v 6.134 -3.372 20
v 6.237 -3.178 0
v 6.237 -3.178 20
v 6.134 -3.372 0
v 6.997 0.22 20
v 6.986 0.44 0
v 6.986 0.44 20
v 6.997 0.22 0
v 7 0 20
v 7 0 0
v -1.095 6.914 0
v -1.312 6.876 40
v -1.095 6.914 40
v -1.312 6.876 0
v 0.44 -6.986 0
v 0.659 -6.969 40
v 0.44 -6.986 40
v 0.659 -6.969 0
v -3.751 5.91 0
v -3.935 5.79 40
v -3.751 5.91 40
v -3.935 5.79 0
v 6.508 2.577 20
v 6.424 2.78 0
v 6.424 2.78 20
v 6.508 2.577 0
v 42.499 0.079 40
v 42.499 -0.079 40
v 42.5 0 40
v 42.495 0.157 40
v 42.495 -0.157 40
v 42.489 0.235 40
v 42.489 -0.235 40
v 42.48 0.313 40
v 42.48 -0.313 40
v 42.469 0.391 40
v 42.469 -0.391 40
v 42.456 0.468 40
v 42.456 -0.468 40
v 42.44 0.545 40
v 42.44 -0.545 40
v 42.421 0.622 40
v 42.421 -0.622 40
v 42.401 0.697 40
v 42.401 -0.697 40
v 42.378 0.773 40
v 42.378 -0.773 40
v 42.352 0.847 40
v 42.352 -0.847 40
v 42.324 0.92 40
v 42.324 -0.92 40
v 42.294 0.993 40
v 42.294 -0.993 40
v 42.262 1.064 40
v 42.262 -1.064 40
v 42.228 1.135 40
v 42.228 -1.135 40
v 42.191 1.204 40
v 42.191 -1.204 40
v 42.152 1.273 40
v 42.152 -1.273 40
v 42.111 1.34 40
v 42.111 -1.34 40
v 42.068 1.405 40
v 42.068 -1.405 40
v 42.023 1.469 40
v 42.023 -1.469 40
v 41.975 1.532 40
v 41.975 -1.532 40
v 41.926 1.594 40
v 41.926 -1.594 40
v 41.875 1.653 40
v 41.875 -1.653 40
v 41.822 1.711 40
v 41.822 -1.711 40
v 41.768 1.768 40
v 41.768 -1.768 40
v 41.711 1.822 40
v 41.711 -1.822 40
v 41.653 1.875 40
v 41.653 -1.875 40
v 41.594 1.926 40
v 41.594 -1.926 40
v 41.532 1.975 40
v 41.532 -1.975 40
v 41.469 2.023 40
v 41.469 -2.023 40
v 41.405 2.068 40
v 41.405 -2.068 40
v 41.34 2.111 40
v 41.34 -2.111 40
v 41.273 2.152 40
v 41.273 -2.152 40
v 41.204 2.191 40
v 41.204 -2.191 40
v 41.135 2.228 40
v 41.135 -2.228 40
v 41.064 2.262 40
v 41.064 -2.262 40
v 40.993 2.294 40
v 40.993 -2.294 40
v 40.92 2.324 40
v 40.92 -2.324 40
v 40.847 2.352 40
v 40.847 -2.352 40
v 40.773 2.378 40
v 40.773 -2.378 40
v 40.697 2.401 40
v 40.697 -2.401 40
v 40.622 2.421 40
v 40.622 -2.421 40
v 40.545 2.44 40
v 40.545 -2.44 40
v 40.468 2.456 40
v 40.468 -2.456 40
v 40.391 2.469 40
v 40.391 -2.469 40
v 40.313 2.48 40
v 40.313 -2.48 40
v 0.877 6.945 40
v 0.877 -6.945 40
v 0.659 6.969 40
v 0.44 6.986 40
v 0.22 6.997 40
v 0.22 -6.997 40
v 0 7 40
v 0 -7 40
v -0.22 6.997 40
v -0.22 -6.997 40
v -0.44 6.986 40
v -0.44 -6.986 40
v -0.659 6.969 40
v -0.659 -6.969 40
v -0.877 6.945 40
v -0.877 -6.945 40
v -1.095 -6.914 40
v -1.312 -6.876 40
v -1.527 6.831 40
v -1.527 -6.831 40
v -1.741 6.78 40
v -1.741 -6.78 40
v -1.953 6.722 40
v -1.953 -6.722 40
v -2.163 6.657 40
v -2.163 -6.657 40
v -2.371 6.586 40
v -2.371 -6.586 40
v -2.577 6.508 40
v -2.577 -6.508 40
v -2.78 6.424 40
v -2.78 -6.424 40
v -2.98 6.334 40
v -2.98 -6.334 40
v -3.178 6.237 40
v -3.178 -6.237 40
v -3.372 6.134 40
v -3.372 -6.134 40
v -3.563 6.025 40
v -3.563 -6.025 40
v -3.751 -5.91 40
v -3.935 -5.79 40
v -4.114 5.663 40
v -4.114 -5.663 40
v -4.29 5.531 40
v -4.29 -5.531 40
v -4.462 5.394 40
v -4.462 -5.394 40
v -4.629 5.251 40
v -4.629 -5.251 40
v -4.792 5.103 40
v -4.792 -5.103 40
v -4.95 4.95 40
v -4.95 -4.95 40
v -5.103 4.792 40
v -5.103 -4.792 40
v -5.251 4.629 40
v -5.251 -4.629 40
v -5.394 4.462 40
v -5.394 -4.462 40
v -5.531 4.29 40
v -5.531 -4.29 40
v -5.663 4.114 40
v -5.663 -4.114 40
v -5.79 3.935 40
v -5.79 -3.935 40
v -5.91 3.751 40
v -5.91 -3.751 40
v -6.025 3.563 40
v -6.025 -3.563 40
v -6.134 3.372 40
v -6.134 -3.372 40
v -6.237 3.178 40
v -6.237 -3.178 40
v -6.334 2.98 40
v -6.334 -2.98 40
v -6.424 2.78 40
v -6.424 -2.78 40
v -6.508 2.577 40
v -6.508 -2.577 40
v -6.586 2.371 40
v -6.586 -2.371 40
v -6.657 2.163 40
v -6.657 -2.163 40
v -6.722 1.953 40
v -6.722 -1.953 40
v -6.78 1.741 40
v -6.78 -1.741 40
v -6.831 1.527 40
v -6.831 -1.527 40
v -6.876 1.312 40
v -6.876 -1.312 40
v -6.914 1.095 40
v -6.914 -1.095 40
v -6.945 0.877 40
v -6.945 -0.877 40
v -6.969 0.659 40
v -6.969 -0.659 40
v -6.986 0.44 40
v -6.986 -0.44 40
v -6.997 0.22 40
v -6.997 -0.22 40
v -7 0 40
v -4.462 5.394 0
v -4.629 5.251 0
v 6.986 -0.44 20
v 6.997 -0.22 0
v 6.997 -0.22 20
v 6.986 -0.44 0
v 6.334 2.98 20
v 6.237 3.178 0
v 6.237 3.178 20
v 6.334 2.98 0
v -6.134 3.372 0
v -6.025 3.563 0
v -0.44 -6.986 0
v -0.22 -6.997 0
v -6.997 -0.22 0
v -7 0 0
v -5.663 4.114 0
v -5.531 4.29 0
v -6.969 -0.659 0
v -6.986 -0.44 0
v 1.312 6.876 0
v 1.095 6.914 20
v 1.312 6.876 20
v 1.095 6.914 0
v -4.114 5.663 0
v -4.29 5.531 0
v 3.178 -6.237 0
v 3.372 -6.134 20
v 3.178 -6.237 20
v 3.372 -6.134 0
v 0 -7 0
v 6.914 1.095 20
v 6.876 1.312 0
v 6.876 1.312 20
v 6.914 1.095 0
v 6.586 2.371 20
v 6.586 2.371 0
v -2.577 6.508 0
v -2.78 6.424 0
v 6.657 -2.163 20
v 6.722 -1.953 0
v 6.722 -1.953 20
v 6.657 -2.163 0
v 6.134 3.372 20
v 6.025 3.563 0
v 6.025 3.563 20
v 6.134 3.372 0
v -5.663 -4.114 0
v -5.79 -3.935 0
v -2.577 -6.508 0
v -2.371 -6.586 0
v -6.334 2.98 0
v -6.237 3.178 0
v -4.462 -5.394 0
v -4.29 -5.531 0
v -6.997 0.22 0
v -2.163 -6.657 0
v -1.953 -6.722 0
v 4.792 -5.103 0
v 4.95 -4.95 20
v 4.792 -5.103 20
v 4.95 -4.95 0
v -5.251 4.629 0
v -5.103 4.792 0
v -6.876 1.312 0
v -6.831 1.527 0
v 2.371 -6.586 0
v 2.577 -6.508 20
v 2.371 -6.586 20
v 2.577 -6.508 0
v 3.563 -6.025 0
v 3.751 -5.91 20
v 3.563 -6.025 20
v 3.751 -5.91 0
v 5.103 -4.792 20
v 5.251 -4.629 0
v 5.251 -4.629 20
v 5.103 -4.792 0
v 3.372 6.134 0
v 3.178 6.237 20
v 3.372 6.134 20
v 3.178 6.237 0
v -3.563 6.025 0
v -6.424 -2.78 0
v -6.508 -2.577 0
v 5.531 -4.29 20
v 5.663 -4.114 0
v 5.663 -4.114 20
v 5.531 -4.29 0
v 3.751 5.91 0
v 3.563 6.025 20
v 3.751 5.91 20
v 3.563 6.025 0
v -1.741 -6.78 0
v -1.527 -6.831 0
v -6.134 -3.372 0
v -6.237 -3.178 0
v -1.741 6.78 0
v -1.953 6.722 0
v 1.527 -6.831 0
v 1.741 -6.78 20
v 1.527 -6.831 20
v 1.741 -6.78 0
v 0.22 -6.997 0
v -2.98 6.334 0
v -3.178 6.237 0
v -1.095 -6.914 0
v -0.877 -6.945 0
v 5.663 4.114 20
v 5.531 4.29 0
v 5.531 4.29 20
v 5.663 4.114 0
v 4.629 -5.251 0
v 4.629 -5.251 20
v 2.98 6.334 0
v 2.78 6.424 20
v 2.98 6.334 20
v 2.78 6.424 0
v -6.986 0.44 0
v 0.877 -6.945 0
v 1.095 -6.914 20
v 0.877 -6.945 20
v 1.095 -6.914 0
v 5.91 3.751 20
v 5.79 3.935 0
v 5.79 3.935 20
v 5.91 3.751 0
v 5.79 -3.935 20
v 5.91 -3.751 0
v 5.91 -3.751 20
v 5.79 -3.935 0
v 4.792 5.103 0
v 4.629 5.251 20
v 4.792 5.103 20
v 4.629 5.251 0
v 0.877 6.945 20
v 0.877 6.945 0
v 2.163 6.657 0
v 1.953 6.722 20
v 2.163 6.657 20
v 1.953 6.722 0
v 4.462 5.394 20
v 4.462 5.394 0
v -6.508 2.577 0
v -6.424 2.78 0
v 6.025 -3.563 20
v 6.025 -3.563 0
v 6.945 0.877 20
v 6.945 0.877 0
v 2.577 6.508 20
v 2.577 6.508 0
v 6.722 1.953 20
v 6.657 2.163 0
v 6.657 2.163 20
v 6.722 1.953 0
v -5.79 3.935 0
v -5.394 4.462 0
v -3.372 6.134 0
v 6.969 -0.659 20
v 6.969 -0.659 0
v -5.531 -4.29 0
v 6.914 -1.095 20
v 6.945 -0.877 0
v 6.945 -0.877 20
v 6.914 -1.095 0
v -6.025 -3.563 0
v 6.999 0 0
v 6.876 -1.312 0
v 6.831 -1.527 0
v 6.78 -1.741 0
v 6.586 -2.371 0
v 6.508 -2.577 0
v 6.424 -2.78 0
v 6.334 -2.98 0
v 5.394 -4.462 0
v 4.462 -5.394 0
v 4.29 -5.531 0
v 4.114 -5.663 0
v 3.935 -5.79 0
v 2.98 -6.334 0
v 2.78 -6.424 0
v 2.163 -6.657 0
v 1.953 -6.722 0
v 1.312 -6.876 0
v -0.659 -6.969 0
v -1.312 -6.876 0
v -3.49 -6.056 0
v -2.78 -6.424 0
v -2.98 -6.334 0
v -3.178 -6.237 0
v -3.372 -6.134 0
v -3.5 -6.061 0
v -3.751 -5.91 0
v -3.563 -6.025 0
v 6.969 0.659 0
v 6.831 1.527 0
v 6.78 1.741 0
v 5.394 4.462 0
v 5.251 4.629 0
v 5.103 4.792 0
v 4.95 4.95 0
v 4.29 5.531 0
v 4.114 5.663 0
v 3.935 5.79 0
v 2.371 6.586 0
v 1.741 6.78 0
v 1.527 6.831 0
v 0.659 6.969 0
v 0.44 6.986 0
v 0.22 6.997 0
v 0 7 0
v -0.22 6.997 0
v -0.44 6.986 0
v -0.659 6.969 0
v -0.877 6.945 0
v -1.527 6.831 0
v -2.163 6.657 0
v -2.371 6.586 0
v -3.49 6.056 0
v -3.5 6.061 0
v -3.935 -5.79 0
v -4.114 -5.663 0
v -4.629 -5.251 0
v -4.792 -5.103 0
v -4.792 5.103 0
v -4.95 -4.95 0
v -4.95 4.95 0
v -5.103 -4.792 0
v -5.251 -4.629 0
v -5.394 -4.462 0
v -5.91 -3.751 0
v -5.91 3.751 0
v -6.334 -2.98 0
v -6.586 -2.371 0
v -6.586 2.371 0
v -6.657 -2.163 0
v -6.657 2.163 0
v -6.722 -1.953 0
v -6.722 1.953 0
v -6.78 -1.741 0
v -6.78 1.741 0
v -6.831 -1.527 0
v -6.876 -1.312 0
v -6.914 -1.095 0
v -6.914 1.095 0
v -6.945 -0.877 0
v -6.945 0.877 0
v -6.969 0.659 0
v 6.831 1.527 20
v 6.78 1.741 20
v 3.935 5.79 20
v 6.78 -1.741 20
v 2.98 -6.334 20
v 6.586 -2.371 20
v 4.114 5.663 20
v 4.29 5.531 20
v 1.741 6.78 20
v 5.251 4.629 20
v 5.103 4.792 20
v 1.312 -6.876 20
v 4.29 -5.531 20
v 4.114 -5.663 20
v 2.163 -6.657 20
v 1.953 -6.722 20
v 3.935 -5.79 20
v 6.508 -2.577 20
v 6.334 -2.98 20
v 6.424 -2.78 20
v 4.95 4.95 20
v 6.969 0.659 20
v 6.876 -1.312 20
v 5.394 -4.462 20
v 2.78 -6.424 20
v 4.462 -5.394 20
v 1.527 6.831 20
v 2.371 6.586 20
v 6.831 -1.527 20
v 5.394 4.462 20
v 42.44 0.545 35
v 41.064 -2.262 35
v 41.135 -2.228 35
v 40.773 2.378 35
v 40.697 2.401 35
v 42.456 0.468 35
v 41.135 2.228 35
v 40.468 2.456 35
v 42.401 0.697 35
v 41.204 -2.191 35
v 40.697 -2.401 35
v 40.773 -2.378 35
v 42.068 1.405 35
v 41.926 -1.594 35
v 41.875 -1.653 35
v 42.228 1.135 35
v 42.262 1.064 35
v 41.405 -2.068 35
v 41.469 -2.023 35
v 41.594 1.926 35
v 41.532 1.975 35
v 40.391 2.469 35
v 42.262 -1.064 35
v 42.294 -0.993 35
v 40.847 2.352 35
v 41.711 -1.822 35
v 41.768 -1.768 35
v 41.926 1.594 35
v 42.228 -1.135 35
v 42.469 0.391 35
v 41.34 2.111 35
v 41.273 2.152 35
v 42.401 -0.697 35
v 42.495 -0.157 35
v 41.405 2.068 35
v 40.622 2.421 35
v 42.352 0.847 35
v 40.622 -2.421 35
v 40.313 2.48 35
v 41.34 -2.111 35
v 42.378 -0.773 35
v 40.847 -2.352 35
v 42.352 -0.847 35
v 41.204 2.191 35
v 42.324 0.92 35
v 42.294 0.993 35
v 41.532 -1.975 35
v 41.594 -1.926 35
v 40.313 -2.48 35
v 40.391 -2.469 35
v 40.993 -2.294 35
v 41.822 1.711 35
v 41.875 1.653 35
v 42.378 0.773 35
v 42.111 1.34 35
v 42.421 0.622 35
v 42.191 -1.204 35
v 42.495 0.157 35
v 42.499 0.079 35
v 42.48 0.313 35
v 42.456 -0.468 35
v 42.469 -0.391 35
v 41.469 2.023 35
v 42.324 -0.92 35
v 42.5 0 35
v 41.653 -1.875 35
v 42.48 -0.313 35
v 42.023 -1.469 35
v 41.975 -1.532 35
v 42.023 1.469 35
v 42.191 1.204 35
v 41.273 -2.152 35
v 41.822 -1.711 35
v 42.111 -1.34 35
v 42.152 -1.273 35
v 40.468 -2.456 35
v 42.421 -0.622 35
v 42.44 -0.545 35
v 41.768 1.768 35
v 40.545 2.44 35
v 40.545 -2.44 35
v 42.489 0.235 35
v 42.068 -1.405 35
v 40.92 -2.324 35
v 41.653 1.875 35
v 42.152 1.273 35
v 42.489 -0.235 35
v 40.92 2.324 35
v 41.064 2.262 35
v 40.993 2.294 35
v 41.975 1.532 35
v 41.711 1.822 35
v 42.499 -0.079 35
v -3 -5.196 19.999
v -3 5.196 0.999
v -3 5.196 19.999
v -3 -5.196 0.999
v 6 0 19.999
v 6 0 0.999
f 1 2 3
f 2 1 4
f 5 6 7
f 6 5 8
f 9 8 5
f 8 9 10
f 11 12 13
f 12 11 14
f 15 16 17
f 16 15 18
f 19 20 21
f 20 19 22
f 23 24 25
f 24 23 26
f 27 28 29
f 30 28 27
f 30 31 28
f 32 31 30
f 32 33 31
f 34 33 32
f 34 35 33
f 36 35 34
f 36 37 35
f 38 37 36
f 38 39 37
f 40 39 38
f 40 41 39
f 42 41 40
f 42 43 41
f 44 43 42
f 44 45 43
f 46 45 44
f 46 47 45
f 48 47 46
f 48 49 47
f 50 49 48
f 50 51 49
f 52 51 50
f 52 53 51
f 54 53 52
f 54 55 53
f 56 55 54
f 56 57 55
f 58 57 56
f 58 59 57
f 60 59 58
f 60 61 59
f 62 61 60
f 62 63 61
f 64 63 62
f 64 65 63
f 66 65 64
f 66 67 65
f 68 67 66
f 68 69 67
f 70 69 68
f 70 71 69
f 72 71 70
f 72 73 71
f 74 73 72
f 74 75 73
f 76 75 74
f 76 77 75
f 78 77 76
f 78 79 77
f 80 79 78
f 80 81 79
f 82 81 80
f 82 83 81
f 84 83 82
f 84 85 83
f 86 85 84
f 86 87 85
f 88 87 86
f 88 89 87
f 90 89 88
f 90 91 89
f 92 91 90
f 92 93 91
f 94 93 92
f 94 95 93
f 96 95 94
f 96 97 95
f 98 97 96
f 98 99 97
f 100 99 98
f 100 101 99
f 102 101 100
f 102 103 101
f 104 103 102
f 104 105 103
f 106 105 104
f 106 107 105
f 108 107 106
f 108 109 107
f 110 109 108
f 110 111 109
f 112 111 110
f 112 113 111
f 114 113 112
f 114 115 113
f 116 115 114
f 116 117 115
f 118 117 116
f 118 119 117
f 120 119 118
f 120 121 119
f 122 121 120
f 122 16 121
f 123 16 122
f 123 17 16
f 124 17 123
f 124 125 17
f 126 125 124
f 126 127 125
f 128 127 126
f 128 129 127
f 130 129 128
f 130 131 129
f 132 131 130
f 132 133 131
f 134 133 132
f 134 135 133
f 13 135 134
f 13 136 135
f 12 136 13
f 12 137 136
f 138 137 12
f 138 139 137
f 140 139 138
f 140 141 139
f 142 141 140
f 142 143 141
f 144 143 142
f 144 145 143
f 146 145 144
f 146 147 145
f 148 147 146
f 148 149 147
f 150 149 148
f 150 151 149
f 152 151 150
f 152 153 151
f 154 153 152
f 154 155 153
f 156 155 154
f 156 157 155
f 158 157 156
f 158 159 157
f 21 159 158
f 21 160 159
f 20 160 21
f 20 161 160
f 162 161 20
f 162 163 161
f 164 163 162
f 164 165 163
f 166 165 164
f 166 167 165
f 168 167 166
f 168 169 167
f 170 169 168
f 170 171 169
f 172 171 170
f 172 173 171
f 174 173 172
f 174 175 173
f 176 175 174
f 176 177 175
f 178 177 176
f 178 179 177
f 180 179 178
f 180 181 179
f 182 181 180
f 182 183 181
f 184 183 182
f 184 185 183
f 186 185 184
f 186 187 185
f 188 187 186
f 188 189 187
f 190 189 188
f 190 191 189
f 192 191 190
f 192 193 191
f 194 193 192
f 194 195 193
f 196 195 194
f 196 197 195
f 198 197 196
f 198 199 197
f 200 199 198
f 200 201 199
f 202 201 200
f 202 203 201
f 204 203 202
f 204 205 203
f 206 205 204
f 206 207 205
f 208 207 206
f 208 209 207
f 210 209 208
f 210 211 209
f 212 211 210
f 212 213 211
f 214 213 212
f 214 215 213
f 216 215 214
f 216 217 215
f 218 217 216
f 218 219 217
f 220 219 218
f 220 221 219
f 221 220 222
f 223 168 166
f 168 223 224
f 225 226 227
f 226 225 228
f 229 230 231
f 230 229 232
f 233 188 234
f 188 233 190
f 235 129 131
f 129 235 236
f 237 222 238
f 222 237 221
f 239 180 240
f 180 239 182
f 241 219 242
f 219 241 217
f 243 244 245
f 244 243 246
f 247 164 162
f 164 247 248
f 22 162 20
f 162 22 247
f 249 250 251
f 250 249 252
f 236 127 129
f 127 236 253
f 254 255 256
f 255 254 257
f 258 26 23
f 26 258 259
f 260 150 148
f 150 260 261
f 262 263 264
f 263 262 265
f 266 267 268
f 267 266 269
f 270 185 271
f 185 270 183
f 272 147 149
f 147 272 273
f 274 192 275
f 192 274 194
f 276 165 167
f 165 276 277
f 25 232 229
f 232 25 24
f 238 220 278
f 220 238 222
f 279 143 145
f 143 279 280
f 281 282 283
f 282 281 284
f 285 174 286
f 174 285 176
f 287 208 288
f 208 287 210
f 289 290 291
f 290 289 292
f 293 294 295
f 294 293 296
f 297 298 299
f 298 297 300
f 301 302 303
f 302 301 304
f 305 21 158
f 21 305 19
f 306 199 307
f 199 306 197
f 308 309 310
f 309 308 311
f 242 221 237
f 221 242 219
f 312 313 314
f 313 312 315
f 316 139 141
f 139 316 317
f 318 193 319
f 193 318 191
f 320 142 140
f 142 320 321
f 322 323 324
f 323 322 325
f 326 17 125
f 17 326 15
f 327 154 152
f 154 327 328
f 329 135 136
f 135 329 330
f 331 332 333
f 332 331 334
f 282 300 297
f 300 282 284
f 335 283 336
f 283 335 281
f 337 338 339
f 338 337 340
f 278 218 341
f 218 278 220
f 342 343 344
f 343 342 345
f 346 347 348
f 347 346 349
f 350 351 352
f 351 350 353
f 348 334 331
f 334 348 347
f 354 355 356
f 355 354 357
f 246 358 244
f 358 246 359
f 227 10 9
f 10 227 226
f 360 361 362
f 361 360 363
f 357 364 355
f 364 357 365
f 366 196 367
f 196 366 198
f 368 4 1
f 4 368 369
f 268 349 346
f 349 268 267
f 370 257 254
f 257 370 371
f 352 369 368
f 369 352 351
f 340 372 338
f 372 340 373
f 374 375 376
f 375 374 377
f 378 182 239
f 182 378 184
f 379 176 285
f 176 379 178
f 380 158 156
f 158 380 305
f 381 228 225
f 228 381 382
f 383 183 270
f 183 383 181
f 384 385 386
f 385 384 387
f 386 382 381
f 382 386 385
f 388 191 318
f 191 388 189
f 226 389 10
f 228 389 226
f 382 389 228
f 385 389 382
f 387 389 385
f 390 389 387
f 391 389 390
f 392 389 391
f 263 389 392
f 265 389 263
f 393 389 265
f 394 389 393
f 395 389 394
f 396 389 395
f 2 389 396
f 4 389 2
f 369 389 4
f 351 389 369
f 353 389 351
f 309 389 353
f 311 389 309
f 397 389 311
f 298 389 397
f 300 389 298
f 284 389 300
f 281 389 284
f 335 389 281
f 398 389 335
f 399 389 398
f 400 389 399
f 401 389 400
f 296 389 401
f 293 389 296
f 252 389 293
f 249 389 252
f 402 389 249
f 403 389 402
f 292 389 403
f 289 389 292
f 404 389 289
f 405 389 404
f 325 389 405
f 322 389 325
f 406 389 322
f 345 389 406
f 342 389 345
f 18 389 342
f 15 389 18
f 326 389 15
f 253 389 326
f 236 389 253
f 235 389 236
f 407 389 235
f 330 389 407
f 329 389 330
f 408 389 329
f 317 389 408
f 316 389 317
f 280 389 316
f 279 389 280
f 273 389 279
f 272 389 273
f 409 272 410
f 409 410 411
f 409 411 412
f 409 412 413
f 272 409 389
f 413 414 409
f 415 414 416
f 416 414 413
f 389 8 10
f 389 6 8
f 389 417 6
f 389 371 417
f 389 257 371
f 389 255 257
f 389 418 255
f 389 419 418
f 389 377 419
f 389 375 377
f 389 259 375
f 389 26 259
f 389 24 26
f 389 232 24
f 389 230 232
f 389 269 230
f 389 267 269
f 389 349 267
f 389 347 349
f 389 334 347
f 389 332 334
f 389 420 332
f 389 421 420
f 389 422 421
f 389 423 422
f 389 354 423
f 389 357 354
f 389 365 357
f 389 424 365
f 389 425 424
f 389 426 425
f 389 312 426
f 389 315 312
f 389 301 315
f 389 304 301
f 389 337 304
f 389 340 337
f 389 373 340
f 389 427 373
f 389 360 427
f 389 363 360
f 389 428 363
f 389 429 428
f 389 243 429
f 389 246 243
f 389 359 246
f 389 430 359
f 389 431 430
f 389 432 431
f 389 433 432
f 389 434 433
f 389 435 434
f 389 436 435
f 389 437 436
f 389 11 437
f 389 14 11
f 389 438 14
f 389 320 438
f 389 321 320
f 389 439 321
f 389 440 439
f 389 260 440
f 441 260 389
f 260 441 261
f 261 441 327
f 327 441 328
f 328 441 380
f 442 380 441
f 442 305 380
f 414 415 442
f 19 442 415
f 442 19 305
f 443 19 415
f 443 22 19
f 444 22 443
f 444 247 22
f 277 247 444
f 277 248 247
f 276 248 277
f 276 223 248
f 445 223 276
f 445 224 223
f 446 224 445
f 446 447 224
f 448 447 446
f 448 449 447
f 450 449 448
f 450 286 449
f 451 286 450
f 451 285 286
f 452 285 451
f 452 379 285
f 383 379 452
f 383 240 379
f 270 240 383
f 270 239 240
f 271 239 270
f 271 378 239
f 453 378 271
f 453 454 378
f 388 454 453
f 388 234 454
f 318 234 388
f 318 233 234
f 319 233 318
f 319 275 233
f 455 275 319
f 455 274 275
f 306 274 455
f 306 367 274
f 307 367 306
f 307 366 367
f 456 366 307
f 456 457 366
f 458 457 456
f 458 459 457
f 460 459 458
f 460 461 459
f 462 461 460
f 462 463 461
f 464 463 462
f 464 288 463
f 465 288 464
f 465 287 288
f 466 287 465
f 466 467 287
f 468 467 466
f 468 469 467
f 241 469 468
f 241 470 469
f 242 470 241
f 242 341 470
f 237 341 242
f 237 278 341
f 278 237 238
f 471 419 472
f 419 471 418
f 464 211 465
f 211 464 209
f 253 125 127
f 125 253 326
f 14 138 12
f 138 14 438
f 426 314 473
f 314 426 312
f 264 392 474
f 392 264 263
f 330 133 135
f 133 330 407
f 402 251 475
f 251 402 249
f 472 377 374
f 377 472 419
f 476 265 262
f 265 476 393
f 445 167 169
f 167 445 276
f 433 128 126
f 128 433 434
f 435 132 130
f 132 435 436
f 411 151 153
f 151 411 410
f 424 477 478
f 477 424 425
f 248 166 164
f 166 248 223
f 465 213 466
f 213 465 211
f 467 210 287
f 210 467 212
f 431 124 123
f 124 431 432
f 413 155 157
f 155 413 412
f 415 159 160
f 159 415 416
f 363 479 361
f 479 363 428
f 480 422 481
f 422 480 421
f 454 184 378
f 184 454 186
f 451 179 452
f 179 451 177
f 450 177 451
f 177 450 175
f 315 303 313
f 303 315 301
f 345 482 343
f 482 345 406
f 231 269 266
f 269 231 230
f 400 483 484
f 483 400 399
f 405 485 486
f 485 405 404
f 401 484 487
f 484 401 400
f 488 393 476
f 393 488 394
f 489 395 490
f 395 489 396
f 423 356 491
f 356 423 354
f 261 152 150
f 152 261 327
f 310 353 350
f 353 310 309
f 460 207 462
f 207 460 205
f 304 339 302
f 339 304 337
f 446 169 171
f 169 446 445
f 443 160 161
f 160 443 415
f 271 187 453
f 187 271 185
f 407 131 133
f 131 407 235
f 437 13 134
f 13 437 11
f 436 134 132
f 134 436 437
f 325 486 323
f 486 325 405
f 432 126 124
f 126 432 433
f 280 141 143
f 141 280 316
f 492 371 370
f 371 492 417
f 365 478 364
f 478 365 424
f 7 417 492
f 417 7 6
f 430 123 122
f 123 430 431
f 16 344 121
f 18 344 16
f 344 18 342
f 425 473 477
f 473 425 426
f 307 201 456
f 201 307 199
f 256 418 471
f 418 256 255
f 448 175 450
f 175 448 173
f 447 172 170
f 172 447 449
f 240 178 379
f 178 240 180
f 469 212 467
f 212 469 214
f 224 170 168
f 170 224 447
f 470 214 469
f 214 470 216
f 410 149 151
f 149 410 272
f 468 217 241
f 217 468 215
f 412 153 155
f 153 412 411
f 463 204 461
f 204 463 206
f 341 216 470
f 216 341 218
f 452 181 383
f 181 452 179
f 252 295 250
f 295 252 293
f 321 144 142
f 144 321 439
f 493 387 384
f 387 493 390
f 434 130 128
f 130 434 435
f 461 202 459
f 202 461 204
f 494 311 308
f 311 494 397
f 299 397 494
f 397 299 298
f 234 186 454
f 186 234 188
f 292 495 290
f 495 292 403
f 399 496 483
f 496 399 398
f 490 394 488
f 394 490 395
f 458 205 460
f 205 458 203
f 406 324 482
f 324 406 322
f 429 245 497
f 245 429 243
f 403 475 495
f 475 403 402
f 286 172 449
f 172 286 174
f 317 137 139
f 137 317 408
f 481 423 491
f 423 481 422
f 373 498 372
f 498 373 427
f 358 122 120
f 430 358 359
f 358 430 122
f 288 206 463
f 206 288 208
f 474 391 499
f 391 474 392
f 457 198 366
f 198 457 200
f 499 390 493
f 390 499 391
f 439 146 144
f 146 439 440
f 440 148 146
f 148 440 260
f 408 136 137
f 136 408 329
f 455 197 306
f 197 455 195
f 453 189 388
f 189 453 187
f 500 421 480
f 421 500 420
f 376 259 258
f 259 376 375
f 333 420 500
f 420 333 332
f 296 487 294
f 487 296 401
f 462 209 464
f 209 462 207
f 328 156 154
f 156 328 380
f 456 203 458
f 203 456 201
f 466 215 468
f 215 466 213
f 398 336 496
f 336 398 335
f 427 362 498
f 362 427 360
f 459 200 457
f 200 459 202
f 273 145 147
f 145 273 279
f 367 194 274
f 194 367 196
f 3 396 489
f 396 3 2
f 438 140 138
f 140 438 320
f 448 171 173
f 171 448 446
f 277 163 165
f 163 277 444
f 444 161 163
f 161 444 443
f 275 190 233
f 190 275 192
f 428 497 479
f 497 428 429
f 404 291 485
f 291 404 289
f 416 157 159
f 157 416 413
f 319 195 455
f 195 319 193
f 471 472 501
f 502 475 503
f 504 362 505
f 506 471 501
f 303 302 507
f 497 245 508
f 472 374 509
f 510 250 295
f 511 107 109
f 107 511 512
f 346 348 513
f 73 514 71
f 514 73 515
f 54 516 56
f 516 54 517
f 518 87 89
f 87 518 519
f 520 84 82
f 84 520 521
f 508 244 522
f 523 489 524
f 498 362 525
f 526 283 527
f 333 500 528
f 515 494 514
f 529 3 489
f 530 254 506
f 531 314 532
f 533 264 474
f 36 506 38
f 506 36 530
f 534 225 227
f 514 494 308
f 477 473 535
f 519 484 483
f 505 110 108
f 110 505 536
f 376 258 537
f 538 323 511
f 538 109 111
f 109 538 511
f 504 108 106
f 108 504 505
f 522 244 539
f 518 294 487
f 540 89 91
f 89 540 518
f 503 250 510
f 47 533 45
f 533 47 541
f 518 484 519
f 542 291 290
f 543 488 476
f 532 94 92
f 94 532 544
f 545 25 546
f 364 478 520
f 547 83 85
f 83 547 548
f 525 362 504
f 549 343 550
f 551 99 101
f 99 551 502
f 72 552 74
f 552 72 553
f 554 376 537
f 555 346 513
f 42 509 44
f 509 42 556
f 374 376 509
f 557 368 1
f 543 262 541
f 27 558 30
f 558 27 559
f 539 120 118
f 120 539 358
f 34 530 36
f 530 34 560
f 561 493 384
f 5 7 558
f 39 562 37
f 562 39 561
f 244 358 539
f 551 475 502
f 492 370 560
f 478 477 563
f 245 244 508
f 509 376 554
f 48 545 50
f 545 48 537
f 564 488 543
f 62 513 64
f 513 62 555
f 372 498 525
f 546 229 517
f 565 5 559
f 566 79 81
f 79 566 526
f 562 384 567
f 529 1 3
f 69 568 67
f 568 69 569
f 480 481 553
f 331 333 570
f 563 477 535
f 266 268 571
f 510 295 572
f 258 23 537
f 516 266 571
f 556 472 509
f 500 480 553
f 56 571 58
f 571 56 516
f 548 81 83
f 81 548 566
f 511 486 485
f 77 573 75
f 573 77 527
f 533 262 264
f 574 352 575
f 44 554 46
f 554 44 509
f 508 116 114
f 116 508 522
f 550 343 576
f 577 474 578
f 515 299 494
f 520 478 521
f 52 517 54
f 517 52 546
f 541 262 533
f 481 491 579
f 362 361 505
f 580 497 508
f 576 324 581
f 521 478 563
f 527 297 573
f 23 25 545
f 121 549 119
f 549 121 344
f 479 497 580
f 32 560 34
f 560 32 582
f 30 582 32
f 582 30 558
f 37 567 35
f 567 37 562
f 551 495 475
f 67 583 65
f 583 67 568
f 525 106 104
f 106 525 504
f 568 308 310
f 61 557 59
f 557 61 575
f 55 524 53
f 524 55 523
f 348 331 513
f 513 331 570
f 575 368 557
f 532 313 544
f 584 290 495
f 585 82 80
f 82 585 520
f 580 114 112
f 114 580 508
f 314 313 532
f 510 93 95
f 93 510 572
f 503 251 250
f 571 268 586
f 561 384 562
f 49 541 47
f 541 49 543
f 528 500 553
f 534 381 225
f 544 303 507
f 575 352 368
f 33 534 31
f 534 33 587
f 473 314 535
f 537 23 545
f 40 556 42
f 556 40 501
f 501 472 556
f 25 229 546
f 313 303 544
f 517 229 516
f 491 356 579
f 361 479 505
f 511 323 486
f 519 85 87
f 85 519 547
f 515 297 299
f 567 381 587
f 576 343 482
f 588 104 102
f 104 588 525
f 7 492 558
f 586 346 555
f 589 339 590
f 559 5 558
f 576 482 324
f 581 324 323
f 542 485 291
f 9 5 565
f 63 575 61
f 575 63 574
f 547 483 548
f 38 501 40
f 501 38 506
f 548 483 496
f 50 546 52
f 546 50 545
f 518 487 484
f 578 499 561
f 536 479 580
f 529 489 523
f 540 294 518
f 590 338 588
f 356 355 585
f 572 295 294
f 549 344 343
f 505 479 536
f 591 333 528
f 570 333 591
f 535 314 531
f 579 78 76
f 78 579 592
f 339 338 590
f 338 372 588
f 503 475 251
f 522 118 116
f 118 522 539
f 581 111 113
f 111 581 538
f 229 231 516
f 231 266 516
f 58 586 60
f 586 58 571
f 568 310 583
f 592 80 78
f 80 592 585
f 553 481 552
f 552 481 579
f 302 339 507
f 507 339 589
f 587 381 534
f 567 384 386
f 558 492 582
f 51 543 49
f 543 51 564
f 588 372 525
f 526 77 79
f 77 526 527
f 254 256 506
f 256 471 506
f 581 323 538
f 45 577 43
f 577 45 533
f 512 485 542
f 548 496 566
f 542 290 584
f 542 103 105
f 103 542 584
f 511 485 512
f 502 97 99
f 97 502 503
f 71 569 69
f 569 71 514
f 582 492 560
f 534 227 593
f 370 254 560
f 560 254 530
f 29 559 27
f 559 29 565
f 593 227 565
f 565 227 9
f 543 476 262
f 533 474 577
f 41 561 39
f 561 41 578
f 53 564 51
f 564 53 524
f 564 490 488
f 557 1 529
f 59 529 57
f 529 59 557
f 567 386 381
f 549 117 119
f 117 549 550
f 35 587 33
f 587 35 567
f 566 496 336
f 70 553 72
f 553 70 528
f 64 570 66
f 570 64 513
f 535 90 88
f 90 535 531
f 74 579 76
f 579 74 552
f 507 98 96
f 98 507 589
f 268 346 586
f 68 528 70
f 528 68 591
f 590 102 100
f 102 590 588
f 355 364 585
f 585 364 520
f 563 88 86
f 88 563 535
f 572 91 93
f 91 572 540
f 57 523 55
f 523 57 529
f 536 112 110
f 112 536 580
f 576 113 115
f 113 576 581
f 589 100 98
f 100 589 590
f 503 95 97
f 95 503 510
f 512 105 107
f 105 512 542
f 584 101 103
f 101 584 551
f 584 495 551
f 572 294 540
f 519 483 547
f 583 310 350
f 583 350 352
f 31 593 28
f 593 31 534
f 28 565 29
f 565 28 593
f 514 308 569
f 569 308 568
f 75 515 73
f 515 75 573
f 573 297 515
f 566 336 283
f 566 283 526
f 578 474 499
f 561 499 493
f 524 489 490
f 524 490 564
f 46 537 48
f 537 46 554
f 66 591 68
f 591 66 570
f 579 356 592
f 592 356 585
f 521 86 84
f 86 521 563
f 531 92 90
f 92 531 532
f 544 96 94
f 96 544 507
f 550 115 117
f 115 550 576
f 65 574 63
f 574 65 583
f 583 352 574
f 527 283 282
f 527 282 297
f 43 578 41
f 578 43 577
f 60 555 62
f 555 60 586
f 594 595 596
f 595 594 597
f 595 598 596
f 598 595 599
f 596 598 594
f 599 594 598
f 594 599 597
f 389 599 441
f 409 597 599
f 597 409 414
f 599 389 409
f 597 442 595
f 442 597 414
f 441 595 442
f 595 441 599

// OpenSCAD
// Shape. 0: L-Shape, 1:T-Shape
Shape = 0; // [0:1]
// This is the distance between the base of the triangle and the opposite vertex
Altitude = 9; // [6:0.5:24]
// This is the height of the cylinder
Height = 20; // [15:60]
// Positive values make the edge thicker by expanding the cylinder’s diameter, while negative values smooth the triangle’s corners.
Border = 1; // [-2:0.1:2]
// Specifies how much the cylinder’s diameter should be reduced.
Thinning = 0; // [0:0.1:2]
// Add keychain hole
KeychainHole = false;

module key() {
    r = 2*Altitude/3;
    difference() {
        union() {
            cylinder(h = Height + 20, r = r + max(Border, 0) - Thinning, $fn=200);  
            for (i = [0:Shape]) {
                rotate([0, 0, i * 180])  hull(){
                    translate([0, 0, Height]) cylinder(h = 20, r = r + max(Border, 0), $fn=200);  
                    translate([40, 0, Height + 20 - 5]) cylinder(h = 5, d = 5, $fn=200);
                } 
            }  
            if (KeychainHole) {
                translate([40 + 5, 0, Height + 20 - 5]) cylinder(h = 5, d = 10, $fn=200);     
            }     
        }
        translate([0, 0, -0.001]) intersection() {
            union() {
                cylinder(h = Height, r = r, $fn=3); 
                cylinder(h = 1, r1 = r + 1, r2 = r, $fn=3);            
            } 
            cylinder(h = Height + 20, r = r + Border, $fn=200);              
        }
        if (KeychainHole) {
            translate([40 + 5, 0, Height + 20 - 5 - 0.001]) cylinder(h = 5 + 0.002, d = 5, $fn=200);   
        }         
    }
}

key();
